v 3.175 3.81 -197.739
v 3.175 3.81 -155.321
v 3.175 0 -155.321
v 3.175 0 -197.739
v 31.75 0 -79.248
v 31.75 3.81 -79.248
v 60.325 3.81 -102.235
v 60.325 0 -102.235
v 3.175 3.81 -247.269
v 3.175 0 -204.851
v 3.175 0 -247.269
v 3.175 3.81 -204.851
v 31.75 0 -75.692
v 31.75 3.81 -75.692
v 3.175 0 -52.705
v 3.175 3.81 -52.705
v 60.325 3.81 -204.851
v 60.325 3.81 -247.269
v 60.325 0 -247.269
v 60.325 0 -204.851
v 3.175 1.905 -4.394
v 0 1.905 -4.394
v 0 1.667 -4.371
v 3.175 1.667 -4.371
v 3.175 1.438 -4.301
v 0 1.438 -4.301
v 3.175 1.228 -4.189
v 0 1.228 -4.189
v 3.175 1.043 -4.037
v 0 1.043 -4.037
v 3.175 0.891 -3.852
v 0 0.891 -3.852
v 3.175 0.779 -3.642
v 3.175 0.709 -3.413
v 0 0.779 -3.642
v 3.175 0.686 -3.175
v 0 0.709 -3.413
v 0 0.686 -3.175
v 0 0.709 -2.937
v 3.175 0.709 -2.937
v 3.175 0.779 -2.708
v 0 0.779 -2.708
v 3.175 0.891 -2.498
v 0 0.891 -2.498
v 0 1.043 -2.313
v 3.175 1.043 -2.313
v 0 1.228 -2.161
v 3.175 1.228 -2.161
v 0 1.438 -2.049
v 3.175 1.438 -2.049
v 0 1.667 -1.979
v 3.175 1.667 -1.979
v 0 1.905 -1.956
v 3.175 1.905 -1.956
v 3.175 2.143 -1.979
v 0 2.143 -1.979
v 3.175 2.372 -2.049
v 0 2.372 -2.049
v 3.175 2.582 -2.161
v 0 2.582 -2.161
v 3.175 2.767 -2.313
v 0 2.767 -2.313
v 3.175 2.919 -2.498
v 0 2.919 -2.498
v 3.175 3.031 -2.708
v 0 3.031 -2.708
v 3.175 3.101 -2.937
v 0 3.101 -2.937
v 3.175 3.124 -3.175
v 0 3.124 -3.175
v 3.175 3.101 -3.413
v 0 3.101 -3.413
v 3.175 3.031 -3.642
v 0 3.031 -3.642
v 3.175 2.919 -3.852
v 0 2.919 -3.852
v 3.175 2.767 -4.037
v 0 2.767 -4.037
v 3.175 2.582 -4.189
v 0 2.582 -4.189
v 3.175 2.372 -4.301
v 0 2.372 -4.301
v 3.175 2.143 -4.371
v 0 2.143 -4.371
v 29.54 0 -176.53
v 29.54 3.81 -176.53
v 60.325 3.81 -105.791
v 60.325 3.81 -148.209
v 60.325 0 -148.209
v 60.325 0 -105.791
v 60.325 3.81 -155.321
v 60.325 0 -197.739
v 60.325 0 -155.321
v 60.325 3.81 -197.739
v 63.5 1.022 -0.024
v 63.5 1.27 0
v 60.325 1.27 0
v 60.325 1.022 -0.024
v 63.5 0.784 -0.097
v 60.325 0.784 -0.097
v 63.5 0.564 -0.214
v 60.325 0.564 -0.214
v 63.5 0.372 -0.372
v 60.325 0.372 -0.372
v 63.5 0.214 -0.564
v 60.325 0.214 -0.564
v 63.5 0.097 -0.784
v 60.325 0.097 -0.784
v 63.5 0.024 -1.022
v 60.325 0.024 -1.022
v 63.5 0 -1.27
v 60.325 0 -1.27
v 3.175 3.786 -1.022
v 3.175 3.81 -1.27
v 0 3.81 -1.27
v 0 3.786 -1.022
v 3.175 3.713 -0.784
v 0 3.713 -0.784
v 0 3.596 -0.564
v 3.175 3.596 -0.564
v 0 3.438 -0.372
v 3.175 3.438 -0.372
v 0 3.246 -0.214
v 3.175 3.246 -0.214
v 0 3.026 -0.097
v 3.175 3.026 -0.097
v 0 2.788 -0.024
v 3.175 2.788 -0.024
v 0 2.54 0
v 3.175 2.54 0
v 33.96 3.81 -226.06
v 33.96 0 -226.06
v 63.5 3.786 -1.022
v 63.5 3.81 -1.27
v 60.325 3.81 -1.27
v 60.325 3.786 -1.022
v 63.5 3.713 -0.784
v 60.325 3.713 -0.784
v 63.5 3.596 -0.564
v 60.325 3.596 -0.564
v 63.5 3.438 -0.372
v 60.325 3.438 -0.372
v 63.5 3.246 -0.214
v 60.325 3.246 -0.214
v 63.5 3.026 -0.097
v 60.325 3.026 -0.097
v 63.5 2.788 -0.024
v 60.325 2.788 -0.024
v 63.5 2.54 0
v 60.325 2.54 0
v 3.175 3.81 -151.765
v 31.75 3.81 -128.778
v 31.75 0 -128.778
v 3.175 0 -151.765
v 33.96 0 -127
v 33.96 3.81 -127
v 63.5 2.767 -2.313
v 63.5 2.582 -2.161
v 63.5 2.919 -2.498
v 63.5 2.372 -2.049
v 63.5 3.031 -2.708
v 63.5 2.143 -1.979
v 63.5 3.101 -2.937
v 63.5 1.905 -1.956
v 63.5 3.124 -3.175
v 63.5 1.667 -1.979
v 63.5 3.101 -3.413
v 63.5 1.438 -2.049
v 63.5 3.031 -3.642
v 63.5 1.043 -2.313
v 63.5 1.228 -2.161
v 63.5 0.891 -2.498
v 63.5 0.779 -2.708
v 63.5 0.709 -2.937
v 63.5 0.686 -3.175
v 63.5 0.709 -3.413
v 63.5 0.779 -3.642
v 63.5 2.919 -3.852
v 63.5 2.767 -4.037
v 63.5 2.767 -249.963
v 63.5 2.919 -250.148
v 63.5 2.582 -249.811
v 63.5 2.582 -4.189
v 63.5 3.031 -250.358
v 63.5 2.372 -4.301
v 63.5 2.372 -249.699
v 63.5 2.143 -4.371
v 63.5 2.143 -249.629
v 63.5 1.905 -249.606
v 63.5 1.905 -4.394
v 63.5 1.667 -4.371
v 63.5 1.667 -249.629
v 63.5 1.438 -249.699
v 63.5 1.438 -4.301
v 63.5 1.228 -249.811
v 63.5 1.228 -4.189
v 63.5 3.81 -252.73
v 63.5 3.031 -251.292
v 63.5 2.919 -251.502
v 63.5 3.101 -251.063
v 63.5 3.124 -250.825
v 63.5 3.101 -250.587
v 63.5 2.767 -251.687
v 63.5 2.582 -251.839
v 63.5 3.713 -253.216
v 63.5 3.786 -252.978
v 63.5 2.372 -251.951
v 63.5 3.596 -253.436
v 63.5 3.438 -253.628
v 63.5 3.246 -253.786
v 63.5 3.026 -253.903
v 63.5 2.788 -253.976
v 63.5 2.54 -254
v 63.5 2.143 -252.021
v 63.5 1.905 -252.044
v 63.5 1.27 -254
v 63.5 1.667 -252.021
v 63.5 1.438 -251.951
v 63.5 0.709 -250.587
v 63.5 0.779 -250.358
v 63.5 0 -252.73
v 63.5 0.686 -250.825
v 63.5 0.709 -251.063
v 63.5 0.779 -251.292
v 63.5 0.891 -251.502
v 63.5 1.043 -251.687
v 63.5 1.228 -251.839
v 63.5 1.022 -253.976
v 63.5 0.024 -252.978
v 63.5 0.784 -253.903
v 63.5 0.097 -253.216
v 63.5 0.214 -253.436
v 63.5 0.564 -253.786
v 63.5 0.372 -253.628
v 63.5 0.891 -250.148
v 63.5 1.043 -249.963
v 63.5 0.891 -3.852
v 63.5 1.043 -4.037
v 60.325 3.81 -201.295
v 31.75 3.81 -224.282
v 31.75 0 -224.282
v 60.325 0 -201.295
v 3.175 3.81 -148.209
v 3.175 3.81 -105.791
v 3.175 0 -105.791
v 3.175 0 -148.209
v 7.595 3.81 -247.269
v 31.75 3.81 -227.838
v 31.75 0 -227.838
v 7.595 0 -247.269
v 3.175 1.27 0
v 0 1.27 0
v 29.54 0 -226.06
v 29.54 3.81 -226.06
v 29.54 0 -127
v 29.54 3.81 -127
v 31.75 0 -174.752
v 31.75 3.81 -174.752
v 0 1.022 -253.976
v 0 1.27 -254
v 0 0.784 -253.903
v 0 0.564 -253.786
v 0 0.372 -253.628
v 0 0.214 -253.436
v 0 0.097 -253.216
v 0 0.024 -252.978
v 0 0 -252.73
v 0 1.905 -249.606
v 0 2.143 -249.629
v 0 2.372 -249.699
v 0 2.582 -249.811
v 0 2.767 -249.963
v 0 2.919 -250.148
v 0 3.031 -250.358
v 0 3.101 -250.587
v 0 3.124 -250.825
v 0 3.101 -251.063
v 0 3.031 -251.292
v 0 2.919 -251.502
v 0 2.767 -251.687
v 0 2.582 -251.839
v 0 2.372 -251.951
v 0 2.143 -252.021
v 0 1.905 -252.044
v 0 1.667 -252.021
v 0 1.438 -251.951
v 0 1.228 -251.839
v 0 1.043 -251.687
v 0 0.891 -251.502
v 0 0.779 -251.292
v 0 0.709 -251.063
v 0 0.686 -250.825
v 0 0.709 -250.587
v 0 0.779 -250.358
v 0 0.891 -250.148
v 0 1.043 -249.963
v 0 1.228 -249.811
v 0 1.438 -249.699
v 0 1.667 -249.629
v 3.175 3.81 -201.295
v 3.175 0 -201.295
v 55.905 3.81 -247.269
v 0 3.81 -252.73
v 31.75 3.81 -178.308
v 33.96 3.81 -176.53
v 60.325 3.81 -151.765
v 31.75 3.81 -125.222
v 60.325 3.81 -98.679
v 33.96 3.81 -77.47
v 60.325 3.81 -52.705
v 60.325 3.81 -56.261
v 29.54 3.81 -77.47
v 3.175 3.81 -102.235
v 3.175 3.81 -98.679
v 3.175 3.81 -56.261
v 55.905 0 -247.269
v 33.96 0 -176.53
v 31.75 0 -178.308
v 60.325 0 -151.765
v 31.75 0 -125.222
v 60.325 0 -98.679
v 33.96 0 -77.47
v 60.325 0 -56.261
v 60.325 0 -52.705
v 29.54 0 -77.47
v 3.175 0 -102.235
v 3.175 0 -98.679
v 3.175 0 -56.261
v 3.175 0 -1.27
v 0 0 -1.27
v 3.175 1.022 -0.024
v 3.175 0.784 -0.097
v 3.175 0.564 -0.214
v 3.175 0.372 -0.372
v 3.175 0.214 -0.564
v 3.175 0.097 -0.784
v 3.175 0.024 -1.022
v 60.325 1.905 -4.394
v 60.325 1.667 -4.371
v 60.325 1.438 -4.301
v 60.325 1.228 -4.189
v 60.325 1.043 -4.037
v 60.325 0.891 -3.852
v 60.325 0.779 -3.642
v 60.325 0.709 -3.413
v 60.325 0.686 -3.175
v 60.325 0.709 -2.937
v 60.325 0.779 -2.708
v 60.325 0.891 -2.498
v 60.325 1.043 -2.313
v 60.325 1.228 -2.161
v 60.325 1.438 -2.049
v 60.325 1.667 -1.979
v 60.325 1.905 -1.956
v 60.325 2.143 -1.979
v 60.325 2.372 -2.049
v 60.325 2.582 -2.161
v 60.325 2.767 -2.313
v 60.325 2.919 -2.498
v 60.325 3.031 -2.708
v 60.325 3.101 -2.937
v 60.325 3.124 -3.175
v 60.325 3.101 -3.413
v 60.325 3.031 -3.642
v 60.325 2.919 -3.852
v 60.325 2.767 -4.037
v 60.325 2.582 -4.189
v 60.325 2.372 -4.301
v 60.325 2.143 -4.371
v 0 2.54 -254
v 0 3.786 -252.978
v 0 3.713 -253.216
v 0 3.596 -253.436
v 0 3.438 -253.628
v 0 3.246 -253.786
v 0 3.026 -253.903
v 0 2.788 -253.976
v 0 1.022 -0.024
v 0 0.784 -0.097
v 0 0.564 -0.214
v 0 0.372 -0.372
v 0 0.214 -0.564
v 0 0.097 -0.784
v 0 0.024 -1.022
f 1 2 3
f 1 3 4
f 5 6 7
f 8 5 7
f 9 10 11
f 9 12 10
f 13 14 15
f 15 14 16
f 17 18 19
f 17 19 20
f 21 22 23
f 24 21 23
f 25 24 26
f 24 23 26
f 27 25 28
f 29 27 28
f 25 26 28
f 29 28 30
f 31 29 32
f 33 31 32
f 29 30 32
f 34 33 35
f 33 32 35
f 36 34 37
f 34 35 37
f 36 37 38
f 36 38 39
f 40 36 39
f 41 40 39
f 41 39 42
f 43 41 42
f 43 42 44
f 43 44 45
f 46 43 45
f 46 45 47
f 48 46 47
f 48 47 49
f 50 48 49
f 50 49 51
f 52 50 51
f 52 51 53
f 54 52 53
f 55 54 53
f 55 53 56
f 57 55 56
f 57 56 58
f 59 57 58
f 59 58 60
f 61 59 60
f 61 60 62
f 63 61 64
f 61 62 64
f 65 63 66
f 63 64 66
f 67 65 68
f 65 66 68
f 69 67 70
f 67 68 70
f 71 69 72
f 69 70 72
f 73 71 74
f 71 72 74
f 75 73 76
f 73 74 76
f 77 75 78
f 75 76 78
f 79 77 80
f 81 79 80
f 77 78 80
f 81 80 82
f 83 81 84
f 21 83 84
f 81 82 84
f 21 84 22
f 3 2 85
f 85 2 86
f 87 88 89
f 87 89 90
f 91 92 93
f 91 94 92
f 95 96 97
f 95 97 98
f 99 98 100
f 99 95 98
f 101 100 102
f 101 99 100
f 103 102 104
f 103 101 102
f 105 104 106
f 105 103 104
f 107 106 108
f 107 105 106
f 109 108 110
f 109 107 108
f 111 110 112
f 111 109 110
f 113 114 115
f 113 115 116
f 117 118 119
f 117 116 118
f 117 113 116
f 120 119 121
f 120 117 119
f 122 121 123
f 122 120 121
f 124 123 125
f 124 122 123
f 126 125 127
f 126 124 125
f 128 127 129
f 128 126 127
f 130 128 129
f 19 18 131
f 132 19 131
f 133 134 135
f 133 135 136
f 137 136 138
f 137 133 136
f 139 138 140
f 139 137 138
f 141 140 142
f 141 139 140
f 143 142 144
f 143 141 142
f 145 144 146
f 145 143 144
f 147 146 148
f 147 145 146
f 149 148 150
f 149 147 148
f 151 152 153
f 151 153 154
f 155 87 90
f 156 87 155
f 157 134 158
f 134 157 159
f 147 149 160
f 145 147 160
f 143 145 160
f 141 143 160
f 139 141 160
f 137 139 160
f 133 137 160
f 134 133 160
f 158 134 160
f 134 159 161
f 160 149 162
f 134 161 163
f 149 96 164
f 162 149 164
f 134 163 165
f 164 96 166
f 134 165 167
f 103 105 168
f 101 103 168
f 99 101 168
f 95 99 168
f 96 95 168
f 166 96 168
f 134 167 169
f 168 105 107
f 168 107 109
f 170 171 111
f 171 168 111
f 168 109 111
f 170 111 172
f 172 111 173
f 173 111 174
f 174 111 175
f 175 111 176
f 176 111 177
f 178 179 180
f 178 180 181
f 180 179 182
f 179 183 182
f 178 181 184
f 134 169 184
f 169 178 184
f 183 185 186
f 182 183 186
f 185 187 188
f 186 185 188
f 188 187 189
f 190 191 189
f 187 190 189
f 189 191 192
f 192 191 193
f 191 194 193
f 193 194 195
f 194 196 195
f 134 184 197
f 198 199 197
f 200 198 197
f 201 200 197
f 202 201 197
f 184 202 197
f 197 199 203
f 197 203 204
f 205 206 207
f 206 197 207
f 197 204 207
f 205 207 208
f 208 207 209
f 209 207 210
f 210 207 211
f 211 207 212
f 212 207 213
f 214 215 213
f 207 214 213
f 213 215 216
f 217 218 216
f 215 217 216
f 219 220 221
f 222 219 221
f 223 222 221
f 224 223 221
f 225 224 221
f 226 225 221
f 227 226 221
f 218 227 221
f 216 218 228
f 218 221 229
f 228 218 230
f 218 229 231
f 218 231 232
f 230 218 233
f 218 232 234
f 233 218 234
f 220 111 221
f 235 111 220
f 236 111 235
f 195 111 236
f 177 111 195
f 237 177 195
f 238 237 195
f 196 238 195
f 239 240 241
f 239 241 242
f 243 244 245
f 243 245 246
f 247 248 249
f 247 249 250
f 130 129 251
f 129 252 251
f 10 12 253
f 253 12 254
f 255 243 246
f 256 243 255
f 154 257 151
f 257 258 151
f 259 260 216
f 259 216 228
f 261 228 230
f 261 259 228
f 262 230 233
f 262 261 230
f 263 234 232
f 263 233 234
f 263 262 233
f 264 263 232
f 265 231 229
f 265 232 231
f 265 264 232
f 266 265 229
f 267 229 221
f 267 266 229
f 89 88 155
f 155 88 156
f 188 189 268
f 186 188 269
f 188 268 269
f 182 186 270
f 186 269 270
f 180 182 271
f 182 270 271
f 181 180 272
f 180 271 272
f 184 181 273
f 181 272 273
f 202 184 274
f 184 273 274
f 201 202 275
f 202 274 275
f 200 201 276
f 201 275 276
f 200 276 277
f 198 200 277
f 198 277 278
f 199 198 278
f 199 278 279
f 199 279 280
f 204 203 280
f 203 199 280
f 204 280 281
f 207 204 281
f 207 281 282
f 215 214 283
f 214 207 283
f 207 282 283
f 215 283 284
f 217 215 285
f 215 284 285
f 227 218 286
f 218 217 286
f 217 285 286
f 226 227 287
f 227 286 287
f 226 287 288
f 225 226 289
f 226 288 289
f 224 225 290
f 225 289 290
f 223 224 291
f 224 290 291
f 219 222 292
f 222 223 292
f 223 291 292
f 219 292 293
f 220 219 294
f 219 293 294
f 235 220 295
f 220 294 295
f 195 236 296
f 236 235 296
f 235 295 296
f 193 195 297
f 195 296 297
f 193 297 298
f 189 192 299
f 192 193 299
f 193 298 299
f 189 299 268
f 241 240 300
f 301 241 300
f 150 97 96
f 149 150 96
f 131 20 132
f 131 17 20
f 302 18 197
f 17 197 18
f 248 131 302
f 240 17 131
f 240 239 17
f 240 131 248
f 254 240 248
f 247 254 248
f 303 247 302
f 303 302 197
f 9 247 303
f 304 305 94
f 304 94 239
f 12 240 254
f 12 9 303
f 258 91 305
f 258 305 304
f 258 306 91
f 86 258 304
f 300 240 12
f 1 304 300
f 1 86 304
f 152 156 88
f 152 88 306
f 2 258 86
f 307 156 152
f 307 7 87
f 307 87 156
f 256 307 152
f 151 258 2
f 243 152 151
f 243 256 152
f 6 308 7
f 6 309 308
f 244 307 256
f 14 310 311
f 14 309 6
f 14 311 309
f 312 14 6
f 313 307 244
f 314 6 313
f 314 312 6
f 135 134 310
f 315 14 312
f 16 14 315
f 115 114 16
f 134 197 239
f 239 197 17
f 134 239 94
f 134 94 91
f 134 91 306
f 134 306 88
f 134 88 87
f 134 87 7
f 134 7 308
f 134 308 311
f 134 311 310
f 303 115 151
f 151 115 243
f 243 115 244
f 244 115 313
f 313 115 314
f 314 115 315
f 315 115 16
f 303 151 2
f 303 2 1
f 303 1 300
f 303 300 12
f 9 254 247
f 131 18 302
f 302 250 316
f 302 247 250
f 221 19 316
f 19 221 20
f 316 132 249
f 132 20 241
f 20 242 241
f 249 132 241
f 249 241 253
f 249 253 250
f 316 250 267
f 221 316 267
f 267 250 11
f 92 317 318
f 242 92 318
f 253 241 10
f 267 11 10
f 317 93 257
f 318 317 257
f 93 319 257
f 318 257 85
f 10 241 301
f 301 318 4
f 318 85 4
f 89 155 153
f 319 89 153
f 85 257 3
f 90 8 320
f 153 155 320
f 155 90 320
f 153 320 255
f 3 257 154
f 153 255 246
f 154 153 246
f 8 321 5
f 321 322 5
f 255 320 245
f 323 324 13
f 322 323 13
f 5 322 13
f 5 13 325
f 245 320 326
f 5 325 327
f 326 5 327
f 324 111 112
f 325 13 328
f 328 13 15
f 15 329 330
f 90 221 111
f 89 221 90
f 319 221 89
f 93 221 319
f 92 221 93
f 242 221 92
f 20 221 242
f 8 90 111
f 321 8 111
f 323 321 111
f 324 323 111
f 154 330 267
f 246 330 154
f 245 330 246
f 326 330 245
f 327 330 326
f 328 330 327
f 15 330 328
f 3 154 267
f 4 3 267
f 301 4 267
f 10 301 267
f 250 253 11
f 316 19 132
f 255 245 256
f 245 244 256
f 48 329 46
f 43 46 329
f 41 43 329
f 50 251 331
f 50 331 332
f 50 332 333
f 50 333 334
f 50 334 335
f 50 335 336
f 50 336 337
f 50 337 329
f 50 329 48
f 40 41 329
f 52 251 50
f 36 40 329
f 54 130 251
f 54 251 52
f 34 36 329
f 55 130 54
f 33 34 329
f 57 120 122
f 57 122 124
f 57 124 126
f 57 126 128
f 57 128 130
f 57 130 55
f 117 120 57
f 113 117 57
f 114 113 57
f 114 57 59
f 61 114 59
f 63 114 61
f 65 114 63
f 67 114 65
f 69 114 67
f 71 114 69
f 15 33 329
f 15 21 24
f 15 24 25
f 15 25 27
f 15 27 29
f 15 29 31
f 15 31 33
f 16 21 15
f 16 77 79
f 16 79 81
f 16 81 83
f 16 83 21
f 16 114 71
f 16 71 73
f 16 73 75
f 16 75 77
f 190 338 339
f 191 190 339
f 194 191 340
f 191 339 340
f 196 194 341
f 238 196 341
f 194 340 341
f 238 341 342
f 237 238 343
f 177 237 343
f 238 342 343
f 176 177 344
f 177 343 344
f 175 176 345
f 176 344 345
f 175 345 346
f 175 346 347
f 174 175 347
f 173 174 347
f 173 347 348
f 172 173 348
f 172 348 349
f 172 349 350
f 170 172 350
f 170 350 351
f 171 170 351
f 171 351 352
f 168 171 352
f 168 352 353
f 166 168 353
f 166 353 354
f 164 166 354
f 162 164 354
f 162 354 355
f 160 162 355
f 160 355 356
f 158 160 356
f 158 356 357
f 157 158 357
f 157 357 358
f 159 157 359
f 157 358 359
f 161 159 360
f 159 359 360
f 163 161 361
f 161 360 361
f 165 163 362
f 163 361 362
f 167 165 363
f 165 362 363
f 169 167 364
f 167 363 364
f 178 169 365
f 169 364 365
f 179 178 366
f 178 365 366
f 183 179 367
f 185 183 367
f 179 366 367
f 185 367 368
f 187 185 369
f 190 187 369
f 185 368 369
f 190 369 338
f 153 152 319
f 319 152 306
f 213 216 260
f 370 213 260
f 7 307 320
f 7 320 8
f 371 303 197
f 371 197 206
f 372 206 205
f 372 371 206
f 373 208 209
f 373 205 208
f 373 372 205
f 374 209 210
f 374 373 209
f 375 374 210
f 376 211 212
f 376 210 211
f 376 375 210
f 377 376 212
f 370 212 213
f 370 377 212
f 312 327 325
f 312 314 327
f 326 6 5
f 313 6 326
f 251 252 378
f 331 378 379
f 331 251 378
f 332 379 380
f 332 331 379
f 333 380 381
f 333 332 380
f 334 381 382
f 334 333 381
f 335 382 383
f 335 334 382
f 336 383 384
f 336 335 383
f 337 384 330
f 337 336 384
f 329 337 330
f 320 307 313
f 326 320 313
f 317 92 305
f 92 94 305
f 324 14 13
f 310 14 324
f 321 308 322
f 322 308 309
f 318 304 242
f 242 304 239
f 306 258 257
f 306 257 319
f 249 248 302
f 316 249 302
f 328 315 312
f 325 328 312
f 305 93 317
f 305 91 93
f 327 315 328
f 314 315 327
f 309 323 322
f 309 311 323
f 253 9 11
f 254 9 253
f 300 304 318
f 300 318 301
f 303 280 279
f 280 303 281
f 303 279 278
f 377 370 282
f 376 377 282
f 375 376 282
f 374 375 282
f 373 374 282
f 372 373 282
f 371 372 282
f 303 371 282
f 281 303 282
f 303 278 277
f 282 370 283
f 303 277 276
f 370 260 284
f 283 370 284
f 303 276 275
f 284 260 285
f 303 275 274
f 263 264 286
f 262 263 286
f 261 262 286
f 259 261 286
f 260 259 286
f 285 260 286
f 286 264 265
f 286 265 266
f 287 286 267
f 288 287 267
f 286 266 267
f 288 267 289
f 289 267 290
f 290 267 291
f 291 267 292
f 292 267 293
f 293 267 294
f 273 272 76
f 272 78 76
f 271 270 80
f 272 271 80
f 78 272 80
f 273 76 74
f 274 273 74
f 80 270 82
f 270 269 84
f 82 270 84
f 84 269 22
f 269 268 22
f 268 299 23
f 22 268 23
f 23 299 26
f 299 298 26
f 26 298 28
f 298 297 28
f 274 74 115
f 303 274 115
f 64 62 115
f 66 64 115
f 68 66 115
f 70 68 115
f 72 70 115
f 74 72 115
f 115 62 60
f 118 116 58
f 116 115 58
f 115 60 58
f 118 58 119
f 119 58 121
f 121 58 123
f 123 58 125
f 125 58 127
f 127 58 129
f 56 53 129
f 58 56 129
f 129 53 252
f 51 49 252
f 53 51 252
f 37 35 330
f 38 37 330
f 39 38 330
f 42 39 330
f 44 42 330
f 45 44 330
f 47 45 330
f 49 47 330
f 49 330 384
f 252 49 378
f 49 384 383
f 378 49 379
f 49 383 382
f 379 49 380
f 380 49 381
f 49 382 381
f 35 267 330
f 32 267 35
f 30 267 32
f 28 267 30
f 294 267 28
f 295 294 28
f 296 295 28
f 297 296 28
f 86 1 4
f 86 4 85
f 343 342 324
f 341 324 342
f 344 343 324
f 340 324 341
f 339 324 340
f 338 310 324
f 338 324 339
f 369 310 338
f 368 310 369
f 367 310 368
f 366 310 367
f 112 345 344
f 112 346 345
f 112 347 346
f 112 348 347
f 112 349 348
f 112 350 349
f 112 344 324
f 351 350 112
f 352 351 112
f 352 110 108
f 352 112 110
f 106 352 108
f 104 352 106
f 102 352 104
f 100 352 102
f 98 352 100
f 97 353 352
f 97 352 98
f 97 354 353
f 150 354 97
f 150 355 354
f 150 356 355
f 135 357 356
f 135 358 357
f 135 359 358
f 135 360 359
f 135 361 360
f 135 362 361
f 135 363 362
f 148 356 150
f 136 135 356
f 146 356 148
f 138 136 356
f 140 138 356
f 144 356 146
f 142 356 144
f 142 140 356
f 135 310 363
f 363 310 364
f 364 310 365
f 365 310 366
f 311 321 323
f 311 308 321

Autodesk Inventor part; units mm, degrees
ref_plane "YZ Plane" through (0, 0, 0) normal (1, 0, 0) x (0, 1, 0)
ref_plane "XZ Plane" through (0, 0, 0) normal (0, 1, 0) x (-1, 0, 0)
sketch "Sketch1" plane through (0, 0, 0) normal (0, 1, 0) x (-1, 0, 0)
  line L0 (0, 0) -> (-63.5, 0)
  line L1 (-63.5, 0) -> (-63.5, -254)
  line L2 (-63.5, -254) -> (0, -254)
  line L3 (0, -254) -> (0, 0)
  dimension "d0" = 63.5
  dimension "d1" = 254
extrude "Extrusion1" add sketch "Sketch1" along normal blind 3.81
sketch "Sketch2" plane through (0, 3.81, 0) normal (0, 1, 0) x (1, 0, 0)
  line L0 (0, 254) -> (0, 0) projected
  line L1 (0, 0) -> (63.5, 0) projected
  line L2 (63.5, 0) -> (63.5, 254) projected
  line L3 (63.5, 254) -> (0, 254) projected
  line L4 (3.175, 3.175) -> (3.175, 250.825)
  line L5 (3.175, 250.825) -> (60.325, 250.825)
  line L6 (60.325, 250.825) -> (60.325, 3.175)
  line L7 (60.325, 3.175) -> (3.175, 3.175)
  line L8 (3.175, 3.175) -> (60.325, 3.175)
  line L9 (60.325, 3.175) -> (60.325, 52.705)
  line L10 (60.325, 52.705) -> (3.175, 52.705)
  line L11 (3.175, 52.705) -> (3.175, 3.175)
  line L12 (3.175, 3.175) -> (3.175, 6.731)
  line L13 (3.175, 6.731) -> (29.5398, 27.94)
  line L14 (60.325, 52.705) -> (60.325, 49.149)
  line L15 (60.325, 49.149) -> (33.9602, 27.94)
  line L16 (3.175, 52.705) -> (3.175, 49.149)
  line L17 (3.175, 49.149) -> (29.5398, 27.94)
  line L18 (60.325, 3.175) -> (60.325, 6.731)
  line L19 (60.325, 6.731) -> (33.9602, 27.94)
  line L20 (31.75, 26.162) -> (3.175, 3.175)
  line L21 (31.75, 29.718) -> (3.175, 52.705)
  line L22 (31.75, 26.162) -> (60.325, 3.175)
  line L23 (31.75, 29.718) -> (60.325, 52.705)
  point P0 (60.325, 3.175)
  dimension "d4" = 3.175
  dimension "d5" = 49.53
  dimension "d6" = 3.556
  dimension "d7" = 3.556
  dimension "d8" = 3.556
  dimension "d9" = 3.556
extrude "Extrusion2" cut sketch "Sketch2" against normal blind 6.35 contours L20 L22 L7 | L4 L17 L13 | L19 L15 L6 | L10 L23 L21
pattern_linear "Rectangular Pattern1" count 5 spacing 49.53 along (0, 0, -1) of "Extrusion2"
sketch "Sketch4" plane through (0, 3.81, 0) normal (0, 1, 0) x (1, 0, 0)
  line L0 (33.9602, 27.94) -> (60.325, 6.731) projected
  line L1 (3.175, 6.731) -> (29.5398, 27.94) projected
  line L2 (60.325, 6.731) -> (3.175, 6.731)
  line L3 (3.175, 3.175) -> (60.325, 3.175) projected
  line L4 (3.175, 6.731) -> (3.175, 3.175)
  line L5 (3.175, 3.175) -> (60.325, 3.175)
  line L6 (60.325, 6.731) -> (60.325, 49.149) projected
  line L7 (60.325, 3.175) -> (60.325, 6.731)
  point P0 (0, 0)
extrude "Extrusion3" add sketch "Sketch4" against normal blind 3.81
sketch "Sketch3" plane through (63.5, 0, 0) normal (1, 0, 0) x (0, 0, -1)
  line L0 (3.175, 3.81) -> (3.175, 0) projected
  point P0 (0, 0)
  point P1 (3.175, 1.905)
  dimension "d15" = 0
hole "Hole1" at (63.5, 1.905, -3.175) direction (-1, 0, 0) diameter 2.4384 end through all clearance for "Flat Head Machine Screw (82)" size "#2" standard "Ansi Unified Screw Threads"
ref_plane "Work Plane1" through (0, 0, -127) normal (0, 0, 1) x (1, 0, 0)
mirror "Mirror1" about plane through (0, 0, -127) normal (0, 0, 1) of "Extrusion3", "Hole1"
fillet "Fillet1" radius 1.27 4 edges at (31.75, 3.81, 0) (31.75, 0, 0) (31.75, 3.81, -254) (31.75, 0, -254)
sketch "Sketch5" plane through (0, 3.81, 0) normal (0, 1, 0) x (1, 0, 0)
  line L0 (3.175, 52.705) -> (31.75, 29.718) projected
  line L1 (3.175, 52.705) -> (60.325, 52.705)
  line L2 (60.325, 52.705) -> (60.325, 0)
  line L3 (60.325, 0) -> (3.175, 0)
  line L4 (3.175, 0) -> (3.175, 52.705)
  line L5 (60.325, 49.149) -> (60.325, 6.731) projected
  line L6 (0, 0) -> (63.5, 0) projected
extrude "Extrusion4" cut sketch "Sketch5" against normal blind 3.81
properties part number "ferris_wheel_main_strut"
